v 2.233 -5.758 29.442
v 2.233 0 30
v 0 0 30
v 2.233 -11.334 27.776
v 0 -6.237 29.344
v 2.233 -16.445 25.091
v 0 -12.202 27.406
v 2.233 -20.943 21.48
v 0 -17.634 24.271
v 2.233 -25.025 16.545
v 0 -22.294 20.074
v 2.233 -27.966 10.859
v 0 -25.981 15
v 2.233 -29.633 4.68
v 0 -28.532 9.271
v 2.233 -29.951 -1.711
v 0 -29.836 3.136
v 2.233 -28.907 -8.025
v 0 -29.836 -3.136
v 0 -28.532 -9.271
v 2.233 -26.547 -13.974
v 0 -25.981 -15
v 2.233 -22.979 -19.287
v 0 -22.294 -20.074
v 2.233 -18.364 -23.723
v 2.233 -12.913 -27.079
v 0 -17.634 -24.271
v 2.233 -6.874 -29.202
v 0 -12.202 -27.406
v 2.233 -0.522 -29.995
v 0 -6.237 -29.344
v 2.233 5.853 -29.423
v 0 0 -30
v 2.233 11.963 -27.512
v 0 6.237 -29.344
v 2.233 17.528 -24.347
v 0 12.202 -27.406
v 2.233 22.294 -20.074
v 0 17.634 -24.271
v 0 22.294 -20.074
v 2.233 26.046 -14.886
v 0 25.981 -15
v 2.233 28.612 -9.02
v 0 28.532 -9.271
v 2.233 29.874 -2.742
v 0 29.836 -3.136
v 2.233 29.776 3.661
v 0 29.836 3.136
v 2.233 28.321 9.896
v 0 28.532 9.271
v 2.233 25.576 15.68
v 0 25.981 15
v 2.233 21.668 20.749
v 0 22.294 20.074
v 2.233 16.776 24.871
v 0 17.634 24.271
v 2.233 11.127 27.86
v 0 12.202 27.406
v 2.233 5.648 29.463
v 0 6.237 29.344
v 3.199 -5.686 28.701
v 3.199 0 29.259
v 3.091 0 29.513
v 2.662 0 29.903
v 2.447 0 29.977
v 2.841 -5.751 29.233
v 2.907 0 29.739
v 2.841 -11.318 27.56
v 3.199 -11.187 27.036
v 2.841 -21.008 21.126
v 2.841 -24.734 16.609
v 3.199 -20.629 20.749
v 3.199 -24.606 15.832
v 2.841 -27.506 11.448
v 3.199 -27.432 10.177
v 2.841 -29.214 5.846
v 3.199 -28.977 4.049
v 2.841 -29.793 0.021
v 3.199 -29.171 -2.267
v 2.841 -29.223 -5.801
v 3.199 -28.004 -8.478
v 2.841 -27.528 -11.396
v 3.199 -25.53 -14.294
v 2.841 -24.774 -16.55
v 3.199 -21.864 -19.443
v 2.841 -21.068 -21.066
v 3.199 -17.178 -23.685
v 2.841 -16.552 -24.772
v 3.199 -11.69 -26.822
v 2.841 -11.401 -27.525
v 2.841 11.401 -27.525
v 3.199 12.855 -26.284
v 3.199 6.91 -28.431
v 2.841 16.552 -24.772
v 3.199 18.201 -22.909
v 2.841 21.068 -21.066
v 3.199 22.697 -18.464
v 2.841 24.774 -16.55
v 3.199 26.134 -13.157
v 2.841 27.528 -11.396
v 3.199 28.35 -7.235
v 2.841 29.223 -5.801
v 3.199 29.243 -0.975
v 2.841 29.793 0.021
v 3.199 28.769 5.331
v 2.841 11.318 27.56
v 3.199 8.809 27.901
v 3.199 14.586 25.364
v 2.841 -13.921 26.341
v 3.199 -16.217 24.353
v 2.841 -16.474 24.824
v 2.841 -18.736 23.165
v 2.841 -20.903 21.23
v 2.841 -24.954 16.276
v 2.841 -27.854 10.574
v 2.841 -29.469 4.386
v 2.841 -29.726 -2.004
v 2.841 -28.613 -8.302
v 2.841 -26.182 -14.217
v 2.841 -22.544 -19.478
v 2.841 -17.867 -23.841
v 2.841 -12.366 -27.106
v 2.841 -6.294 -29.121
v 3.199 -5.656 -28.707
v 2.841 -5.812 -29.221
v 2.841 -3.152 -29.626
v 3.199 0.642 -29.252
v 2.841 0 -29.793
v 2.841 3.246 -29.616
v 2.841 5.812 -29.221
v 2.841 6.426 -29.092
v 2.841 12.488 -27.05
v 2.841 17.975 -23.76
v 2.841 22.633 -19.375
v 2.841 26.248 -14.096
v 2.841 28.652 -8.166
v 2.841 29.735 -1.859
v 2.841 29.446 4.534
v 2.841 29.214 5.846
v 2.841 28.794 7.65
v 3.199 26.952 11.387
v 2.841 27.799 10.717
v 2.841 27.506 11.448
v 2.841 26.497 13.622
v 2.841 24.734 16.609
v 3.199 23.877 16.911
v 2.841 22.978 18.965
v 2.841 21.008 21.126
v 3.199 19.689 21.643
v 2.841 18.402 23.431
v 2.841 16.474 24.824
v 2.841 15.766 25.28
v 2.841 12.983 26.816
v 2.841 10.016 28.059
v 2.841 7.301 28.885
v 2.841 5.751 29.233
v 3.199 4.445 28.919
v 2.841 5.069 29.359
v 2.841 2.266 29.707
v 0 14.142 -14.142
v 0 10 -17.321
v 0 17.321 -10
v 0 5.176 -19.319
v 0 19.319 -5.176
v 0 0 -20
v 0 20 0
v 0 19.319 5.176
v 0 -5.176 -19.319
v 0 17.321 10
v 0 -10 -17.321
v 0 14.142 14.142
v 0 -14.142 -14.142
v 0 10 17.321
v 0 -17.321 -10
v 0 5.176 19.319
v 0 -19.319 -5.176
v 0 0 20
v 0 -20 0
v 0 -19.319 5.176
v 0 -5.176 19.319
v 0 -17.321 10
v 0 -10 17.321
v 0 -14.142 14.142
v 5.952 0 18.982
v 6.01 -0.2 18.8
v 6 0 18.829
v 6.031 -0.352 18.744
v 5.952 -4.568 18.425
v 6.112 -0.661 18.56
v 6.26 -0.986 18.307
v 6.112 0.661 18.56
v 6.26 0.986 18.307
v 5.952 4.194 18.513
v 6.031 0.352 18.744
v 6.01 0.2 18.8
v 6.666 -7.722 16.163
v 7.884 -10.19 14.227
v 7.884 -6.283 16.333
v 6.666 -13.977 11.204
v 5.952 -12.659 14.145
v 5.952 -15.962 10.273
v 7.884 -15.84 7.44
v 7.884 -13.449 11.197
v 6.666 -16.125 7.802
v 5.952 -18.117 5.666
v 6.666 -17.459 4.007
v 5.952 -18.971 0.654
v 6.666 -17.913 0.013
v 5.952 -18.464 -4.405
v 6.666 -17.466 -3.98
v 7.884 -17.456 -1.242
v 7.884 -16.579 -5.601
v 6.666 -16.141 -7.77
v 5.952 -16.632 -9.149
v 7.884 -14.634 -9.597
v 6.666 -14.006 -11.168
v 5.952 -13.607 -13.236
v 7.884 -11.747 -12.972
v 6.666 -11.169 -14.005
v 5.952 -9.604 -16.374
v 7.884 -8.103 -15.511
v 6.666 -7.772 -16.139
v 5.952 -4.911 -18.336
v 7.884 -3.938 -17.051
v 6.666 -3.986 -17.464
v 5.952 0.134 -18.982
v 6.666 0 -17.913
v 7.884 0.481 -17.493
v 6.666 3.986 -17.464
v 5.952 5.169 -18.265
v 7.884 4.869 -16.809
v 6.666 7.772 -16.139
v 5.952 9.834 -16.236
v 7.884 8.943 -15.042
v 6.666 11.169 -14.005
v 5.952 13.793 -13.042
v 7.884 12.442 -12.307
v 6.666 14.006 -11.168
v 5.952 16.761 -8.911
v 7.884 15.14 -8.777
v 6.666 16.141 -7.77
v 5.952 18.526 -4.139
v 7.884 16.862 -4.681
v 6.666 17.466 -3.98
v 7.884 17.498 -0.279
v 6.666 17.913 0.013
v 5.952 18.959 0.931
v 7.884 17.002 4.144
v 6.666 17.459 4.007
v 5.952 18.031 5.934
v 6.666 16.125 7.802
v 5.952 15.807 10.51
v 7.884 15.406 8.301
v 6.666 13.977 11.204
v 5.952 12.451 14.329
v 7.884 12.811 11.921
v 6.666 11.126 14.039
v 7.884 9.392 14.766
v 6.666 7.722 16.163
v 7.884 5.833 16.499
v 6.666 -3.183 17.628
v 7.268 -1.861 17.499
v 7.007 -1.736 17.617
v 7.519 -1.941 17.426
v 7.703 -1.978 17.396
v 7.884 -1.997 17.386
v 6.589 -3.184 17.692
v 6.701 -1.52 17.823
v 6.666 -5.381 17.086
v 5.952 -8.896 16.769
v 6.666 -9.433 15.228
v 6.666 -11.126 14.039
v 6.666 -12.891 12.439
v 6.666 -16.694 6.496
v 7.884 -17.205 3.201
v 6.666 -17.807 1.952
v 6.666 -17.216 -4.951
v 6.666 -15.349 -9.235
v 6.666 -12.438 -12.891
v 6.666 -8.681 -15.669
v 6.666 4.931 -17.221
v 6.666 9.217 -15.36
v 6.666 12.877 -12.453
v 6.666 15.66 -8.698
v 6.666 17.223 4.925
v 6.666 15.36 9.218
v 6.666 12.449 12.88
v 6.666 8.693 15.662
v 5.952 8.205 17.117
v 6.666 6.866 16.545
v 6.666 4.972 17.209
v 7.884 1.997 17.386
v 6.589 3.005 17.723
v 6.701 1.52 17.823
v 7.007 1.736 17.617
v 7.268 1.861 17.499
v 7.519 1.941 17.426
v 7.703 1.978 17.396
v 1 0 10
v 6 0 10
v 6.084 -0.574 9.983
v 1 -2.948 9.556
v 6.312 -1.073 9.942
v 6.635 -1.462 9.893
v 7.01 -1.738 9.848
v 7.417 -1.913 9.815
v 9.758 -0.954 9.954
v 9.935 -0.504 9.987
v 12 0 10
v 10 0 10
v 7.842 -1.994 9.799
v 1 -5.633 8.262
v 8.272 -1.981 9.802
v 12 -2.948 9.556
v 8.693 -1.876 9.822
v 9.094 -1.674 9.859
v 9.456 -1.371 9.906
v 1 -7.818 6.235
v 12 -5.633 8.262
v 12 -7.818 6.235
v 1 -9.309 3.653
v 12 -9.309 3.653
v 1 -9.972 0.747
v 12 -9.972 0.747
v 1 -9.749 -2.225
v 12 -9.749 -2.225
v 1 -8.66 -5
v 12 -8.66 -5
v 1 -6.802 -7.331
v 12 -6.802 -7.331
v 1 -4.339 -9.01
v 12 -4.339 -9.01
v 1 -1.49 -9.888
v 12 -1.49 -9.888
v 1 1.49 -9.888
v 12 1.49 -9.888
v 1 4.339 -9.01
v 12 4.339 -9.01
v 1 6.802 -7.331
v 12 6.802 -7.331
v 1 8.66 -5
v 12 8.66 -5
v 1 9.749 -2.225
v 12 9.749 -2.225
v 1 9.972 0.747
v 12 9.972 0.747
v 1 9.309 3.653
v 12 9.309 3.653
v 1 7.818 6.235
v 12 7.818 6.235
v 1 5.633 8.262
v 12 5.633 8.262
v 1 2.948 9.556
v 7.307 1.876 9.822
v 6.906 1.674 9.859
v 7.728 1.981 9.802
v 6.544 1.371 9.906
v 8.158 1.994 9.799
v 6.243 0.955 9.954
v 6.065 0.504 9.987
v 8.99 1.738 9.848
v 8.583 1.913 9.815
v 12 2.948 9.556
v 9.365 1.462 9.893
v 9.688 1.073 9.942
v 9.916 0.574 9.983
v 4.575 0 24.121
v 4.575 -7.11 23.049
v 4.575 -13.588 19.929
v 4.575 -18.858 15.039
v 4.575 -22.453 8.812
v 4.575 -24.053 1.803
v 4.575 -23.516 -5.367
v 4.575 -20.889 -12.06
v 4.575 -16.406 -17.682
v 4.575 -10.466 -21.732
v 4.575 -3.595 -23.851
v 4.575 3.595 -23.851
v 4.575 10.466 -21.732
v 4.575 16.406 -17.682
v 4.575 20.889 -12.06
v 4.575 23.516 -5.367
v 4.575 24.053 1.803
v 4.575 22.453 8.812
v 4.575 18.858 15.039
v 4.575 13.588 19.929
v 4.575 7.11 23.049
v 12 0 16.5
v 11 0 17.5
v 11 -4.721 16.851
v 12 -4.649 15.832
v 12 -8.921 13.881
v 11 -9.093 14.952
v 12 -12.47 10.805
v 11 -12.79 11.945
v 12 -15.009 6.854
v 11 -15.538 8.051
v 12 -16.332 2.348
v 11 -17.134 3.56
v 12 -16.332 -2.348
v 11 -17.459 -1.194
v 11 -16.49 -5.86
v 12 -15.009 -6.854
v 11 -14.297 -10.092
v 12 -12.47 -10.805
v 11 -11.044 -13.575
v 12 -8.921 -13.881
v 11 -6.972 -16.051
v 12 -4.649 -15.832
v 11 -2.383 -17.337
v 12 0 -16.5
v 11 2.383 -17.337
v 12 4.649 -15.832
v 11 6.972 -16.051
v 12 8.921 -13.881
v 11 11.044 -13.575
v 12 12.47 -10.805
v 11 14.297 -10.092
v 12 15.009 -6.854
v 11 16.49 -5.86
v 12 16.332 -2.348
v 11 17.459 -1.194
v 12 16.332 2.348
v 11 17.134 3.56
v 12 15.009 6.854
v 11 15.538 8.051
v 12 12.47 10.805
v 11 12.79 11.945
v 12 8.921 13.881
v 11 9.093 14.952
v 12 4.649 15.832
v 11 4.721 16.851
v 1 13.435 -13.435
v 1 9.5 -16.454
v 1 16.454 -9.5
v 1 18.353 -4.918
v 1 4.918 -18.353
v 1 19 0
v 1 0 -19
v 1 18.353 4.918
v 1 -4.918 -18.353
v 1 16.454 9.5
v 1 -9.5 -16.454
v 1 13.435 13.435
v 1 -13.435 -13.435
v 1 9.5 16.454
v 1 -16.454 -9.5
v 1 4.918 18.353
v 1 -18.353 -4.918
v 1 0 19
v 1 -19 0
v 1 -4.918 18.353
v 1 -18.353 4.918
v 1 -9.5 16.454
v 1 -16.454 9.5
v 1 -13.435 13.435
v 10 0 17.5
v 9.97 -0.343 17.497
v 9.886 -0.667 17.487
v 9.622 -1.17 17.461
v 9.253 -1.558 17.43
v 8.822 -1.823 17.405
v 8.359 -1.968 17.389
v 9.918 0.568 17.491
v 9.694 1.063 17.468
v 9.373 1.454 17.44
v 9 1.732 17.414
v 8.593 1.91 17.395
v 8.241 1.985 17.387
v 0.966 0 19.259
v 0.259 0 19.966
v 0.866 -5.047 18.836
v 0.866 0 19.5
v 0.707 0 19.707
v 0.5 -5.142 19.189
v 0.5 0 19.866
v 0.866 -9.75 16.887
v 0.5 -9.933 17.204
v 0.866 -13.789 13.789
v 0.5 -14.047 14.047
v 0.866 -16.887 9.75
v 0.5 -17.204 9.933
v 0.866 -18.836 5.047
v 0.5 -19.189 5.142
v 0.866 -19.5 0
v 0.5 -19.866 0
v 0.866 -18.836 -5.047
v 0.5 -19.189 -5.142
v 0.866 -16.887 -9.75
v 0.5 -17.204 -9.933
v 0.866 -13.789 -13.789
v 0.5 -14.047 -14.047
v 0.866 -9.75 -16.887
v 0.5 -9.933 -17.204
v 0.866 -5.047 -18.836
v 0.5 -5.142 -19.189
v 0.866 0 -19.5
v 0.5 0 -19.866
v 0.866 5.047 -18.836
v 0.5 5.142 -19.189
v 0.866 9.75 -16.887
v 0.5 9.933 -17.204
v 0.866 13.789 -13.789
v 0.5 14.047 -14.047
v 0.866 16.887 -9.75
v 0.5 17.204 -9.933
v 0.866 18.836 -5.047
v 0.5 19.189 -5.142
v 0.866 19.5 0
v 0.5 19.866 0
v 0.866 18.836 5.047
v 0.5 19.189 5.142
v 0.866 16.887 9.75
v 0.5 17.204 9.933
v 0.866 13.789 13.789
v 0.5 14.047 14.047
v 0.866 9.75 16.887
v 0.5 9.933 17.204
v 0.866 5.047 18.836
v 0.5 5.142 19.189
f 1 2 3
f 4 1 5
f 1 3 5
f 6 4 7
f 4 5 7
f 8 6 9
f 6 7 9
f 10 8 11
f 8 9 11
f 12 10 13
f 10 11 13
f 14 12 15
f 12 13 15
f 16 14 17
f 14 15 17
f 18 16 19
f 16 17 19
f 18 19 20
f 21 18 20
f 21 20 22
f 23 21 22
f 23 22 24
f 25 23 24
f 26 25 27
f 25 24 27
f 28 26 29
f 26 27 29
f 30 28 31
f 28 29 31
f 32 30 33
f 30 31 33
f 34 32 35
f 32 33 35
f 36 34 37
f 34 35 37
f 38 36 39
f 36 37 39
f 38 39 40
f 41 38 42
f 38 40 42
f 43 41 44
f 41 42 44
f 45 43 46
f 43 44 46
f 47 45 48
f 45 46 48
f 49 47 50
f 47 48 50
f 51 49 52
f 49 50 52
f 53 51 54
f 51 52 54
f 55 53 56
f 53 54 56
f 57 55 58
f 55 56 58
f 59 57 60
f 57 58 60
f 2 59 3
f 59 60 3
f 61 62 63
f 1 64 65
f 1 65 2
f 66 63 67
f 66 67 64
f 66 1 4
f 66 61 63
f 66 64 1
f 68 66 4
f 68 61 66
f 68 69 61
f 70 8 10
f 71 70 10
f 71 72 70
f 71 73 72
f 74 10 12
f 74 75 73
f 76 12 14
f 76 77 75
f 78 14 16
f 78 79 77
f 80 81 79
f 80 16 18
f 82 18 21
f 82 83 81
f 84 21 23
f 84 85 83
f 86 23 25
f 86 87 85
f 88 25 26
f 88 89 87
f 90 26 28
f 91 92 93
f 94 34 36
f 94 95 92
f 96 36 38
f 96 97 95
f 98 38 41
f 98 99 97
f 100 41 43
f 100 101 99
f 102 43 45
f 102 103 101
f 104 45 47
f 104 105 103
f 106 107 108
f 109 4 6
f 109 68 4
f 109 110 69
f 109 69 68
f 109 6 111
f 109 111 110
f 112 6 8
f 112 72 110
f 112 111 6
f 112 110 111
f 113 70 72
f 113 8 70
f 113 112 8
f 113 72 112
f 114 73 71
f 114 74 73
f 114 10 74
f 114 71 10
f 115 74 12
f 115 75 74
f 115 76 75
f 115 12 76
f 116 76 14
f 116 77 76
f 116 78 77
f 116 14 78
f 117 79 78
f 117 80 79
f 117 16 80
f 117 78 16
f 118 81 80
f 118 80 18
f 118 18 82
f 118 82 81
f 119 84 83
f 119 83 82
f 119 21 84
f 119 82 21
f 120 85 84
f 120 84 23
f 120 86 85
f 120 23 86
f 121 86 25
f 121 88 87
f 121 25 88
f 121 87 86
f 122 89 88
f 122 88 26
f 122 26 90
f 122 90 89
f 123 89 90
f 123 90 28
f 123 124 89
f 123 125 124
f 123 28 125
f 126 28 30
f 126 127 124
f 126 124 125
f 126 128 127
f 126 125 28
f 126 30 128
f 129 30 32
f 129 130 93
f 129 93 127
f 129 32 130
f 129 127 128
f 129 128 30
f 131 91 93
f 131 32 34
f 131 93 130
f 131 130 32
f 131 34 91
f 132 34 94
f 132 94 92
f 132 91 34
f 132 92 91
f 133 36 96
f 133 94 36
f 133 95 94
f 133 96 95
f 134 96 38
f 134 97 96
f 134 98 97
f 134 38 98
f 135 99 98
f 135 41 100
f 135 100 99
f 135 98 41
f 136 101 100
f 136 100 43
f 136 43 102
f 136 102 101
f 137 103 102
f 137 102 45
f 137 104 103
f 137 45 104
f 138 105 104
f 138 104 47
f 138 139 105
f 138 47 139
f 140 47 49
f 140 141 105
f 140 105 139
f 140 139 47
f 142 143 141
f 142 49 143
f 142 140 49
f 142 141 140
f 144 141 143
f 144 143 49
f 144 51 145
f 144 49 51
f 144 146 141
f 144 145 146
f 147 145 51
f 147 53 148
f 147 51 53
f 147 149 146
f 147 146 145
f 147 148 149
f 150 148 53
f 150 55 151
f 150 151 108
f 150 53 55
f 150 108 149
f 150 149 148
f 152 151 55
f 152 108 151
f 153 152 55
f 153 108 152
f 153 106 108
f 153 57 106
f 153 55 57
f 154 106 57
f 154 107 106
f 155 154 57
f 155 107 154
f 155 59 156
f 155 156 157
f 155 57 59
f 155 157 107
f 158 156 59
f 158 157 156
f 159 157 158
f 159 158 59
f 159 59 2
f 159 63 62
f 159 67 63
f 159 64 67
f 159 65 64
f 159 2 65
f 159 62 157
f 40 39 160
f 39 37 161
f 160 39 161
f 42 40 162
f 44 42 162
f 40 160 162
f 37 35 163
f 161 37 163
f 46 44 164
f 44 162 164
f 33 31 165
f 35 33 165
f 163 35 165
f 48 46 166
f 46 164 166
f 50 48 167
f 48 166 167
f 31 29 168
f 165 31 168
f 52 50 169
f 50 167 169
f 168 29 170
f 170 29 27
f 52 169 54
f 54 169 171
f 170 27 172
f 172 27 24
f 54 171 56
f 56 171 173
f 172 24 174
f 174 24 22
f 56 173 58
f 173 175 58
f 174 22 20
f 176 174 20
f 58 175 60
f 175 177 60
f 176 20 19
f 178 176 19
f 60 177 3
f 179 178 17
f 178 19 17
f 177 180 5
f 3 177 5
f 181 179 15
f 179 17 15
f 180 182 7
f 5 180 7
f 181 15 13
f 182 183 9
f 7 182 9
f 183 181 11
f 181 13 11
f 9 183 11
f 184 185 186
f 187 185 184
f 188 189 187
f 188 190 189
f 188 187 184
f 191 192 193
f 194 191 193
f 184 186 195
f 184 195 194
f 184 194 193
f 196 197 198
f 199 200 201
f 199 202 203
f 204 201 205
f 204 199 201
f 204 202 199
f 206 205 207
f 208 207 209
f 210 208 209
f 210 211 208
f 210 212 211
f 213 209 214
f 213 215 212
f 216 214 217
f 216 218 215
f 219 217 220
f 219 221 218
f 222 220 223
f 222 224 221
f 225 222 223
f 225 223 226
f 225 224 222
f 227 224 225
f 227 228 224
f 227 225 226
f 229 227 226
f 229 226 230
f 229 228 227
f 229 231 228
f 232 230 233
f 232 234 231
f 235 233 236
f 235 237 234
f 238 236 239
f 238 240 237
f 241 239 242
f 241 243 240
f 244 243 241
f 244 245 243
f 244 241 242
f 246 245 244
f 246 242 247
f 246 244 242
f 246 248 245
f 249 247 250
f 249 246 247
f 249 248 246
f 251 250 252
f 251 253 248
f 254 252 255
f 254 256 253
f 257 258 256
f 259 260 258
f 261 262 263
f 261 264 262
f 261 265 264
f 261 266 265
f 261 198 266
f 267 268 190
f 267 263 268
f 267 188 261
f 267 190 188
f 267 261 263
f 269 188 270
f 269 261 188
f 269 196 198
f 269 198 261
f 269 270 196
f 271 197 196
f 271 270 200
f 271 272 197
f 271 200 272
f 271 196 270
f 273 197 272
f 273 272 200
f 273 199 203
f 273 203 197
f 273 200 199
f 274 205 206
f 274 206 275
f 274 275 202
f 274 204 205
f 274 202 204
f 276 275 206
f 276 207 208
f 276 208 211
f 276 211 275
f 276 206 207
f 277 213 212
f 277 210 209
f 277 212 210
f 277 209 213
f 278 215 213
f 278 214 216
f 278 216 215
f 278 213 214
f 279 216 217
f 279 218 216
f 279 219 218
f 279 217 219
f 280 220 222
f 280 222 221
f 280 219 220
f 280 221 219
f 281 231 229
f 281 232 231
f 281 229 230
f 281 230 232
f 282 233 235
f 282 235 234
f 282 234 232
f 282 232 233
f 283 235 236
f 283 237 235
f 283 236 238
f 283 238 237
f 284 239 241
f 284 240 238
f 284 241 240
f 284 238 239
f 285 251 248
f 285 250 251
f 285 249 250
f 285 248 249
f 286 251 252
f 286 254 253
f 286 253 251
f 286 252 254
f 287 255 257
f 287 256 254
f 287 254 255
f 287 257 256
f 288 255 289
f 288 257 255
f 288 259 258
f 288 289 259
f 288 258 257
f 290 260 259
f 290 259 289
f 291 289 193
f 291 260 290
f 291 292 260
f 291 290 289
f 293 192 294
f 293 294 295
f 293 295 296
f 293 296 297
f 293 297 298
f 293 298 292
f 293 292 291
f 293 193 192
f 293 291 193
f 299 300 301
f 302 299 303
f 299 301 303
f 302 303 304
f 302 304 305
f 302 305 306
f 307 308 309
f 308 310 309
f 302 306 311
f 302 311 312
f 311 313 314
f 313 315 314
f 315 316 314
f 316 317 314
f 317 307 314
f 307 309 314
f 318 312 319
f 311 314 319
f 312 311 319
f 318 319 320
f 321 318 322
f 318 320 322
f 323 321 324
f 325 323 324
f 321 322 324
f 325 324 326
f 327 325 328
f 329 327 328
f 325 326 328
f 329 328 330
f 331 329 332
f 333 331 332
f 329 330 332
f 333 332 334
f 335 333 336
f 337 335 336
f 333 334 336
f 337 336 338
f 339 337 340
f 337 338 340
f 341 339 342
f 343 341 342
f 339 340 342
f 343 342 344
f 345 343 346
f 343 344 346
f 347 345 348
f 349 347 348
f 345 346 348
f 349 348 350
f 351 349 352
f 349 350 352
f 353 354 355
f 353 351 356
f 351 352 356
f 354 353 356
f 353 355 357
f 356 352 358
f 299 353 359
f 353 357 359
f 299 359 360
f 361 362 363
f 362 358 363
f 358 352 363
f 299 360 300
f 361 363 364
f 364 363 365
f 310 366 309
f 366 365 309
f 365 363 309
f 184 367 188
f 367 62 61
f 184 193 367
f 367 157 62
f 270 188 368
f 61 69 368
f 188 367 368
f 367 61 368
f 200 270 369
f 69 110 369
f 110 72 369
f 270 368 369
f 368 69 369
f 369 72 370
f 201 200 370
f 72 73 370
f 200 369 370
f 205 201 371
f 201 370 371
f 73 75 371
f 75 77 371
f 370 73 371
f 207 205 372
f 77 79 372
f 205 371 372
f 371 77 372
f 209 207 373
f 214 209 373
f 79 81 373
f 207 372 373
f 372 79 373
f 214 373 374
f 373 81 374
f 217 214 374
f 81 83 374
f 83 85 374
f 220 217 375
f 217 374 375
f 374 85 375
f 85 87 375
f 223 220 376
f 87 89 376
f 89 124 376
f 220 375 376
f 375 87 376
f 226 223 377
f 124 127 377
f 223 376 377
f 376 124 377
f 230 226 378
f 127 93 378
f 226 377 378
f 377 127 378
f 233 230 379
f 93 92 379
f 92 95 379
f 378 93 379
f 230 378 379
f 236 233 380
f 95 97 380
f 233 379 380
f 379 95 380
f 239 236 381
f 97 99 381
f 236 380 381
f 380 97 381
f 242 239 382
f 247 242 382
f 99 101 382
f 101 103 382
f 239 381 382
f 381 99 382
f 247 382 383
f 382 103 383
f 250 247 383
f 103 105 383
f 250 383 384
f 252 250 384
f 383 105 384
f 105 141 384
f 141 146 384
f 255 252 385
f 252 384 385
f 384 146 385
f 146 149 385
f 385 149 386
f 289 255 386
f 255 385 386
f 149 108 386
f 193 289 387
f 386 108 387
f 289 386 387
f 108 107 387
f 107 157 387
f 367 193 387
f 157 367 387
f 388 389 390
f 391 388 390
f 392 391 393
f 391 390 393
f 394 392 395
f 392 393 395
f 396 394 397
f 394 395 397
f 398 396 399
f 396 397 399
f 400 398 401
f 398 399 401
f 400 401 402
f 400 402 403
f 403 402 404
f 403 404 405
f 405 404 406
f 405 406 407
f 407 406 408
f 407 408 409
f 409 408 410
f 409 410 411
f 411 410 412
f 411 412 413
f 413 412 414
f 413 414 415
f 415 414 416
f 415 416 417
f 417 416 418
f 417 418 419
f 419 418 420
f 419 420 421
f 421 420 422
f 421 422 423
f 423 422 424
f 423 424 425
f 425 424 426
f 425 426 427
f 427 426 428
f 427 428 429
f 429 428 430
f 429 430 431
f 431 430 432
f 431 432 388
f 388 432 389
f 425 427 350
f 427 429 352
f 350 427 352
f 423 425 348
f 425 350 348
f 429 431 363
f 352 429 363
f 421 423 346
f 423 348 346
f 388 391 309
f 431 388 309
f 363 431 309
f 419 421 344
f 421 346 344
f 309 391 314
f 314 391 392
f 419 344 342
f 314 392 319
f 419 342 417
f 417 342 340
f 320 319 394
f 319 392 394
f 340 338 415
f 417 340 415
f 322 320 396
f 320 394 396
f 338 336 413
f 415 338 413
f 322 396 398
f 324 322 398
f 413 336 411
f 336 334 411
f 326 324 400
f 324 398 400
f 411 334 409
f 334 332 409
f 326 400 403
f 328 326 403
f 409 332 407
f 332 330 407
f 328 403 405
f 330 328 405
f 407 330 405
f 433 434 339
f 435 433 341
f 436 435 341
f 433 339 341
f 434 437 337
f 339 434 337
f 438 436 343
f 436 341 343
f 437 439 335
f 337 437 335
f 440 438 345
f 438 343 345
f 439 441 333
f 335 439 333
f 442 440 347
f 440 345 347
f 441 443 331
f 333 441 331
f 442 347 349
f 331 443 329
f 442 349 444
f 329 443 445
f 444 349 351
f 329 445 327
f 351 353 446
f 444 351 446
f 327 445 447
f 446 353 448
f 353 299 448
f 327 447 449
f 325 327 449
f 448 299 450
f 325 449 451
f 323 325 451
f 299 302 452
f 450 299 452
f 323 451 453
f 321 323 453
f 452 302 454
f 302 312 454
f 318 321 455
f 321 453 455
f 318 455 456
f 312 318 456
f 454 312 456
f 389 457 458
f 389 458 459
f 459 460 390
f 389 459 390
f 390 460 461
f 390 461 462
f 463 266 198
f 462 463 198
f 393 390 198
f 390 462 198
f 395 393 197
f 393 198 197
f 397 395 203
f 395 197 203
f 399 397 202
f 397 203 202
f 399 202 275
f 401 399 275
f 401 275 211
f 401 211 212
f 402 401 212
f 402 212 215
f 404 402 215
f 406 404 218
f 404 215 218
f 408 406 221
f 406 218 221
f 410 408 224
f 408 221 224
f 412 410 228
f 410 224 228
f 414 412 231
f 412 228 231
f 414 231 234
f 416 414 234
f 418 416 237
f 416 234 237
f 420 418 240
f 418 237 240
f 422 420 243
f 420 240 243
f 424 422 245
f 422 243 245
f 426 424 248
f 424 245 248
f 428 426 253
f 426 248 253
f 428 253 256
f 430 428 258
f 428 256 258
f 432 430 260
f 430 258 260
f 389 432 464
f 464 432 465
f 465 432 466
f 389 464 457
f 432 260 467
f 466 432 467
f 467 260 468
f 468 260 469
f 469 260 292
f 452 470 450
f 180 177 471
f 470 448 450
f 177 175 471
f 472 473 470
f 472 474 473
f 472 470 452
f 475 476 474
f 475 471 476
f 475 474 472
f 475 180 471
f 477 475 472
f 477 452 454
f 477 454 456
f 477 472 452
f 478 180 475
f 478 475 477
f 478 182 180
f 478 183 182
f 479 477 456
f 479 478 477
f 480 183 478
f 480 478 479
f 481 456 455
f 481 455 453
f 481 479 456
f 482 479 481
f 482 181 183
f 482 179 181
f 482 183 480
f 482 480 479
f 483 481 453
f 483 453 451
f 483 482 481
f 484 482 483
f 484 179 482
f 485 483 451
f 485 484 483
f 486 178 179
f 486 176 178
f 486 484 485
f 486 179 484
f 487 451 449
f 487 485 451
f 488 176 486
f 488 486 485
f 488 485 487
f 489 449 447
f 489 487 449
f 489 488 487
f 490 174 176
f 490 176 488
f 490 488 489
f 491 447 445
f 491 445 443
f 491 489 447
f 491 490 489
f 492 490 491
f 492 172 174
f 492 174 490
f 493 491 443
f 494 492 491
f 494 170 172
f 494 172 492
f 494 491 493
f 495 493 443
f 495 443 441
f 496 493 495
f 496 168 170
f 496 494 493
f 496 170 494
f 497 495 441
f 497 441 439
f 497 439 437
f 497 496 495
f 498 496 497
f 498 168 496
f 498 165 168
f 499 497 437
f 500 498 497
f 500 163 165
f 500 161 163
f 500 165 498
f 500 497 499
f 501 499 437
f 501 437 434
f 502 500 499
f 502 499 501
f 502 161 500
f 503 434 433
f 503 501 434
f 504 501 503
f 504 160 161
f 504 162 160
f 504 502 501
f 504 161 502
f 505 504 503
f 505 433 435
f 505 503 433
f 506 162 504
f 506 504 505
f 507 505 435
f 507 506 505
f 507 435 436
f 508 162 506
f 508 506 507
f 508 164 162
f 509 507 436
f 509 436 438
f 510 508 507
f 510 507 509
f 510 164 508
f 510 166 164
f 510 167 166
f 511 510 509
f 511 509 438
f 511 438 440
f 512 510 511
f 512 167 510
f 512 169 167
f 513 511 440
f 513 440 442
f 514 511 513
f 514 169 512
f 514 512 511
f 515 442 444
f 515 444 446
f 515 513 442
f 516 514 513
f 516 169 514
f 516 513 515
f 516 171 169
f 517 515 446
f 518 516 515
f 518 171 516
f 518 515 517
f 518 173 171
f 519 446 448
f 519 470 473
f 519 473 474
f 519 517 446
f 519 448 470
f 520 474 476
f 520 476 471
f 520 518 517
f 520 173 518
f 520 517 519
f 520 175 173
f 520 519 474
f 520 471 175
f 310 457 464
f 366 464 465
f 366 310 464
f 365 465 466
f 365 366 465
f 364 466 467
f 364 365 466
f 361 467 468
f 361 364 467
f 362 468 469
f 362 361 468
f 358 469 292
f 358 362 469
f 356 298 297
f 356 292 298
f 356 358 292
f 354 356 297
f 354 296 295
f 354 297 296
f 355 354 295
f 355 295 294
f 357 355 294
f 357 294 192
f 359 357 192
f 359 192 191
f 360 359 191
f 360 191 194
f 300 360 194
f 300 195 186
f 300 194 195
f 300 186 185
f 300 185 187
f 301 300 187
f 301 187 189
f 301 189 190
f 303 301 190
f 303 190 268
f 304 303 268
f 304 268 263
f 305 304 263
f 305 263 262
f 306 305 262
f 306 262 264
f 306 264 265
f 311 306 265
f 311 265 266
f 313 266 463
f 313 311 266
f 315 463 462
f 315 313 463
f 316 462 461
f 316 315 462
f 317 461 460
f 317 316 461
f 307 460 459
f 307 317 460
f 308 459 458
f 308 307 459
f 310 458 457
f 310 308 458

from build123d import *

# Parameters (mm, degrees)
F2_SIZE  = 1
F3_R     = 0.99999
F4_R     = 2
F5_R     = 2
F6_DEPTH = 30.0010001


# Not quite as in the source:
# - a fillet or chamfer is up to 0.001 mm smaller than in the source, because OpenCascade refuses the exact size


with BuildPart() as f1:
    # F0 (on Front) → F1 (revolve)
    with BuildSketch(Plane.XZ):
        Polygon((0, 30), (0, 20), (1, 20), (1, 10), (12, 10), (12, 17.5), (6.3493649054, 17.5), (3, 30), align=None)
    revolve(axis=Axis((7.1844396027, 0, 0), (1, 0, 0)))

    # F2
    f2_edges = [f1.edges().sort_by_distance(p)[0] for p in [
        (12, 0, -17.5),
    ]]
    chamfer(f2_edges, length=F2_SIZE)

    # F3 (radius 1 in the source; OpenCascade refuses exactly that, so slightly less here)
    f3_edges = [f1.edges().sort_by_distance(p)[0] for p in [
        (3, 0, -30),
        (1, 0, -20),
    ]]
    fillet(f3_edges, radius=F3_R)

    # F4
    f4_edges = [f1.edges().sort_by_distance(p)[0] for p in [
        (6.349365, 0, -17.5),
    ]]
    fillet(f4_edges, radius=F4_R)

    # F5 (on Top) → F6 (cut, through all)
    with BuildSketch(Plane.XY):
        with Locations((8, 0)):
            Circle(F5_R)
    extrude(amount=F6_DEPTH, mode=Mode.SUBTRACT)


solid = f1.part
